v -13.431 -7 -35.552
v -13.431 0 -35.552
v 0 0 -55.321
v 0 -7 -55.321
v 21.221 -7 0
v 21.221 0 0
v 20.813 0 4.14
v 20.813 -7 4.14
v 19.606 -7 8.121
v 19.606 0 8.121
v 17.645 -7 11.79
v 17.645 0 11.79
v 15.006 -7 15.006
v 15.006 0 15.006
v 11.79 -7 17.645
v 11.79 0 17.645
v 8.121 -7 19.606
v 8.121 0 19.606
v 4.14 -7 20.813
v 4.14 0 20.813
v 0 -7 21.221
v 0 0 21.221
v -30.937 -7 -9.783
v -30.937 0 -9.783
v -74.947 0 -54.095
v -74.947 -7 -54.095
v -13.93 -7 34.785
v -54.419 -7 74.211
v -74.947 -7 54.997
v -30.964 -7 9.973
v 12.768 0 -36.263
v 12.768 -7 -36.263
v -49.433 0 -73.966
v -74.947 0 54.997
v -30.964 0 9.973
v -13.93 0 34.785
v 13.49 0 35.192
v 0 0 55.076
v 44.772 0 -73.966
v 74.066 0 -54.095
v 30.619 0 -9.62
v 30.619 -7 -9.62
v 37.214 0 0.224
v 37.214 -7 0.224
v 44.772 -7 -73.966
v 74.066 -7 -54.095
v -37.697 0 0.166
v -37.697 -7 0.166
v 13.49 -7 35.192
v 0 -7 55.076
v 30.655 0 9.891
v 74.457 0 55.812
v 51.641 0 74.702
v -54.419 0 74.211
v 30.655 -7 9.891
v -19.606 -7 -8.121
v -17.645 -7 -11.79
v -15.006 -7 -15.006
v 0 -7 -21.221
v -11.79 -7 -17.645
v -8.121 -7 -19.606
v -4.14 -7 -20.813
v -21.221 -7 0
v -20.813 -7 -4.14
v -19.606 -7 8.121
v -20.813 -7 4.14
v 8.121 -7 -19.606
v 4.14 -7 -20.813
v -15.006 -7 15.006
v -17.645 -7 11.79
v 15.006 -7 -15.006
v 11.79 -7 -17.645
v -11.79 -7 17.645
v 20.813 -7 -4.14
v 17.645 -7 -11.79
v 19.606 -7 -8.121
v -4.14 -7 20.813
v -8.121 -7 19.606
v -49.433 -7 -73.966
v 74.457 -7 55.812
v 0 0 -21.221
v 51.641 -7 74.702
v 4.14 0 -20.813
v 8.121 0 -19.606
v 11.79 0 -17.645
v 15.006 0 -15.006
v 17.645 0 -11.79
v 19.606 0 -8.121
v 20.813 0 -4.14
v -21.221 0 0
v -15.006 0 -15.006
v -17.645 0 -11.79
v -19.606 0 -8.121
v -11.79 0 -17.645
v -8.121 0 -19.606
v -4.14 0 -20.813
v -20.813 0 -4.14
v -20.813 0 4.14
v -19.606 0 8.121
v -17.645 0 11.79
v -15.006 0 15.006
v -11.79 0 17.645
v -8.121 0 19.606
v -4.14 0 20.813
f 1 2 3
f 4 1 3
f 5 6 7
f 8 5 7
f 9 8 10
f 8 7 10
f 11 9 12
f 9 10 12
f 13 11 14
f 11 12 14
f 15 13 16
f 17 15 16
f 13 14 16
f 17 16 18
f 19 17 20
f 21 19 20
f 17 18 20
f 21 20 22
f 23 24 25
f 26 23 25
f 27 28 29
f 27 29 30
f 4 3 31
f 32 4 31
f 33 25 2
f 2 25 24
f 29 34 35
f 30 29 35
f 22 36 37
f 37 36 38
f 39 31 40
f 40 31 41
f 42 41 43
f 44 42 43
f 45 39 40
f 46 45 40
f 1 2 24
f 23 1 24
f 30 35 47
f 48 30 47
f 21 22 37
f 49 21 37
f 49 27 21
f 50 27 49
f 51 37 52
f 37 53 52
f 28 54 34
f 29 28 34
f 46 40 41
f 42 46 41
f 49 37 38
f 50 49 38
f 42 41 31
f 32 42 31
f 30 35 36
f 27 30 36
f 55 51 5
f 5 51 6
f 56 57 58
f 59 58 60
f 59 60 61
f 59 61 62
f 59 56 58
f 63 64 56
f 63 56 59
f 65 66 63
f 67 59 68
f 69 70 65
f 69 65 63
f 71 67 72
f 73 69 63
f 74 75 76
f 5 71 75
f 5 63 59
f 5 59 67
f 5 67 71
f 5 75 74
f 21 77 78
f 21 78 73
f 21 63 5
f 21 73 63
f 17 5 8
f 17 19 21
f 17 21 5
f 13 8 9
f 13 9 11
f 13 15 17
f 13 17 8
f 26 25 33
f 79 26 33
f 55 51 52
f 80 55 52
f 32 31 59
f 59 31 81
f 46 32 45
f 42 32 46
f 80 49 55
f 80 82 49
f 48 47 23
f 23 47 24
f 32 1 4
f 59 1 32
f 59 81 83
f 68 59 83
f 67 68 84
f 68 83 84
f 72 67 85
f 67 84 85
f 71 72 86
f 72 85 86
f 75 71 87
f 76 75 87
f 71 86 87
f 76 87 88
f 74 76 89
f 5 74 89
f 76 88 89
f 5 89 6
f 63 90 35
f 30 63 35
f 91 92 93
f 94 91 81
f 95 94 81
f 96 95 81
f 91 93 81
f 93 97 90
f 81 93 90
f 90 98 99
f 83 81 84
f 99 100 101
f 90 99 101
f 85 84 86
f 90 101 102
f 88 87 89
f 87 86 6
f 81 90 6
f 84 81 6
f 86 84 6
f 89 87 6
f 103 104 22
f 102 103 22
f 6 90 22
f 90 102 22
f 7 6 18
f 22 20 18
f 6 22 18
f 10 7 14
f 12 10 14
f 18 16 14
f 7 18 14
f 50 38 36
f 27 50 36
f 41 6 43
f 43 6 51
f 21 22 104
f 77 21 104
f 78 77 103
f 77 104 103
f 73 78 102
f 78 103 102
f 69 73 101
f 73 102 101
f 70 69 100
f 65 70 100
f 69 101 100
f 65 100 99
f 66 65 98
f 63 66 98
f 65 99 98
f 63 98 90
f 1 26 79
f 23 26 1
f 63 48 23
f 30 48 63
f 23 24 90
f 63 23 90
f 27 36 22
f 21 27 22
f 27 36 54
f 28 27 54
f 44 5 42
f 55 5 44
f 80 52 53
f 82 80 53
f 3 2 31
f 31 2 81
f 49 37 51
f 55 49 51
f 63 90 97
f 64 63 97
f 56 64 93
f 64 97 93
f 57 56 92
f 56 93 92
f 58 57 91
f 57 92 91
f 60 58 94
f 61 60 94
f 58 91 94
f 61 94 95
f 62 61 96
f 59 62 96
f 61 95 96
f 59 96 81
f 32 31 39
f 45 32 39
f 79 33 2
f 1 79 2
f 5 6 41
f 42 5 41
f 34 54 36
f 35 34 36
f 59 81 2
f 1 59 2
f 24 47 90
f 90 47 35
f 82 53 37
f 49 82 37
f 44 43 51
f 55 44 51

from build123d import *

# Parameters (mm, degrees)
F1_DEPTH = 7


with BuildPart() as f1:
    # F0 (on Front) → F1 (new body)
    with BuildSketch(Plane.XZ):
        with BuildLine():
            ThreePointArc((0, -21.2211485282), (15.0056180289, -15.0056180289), (21.2211485282, 0))
            ThreePointArc((21.2211485282, 0), (15.0056180289, 15.0056180289), (0, 21.2211485282))
            ThreePointArc((0, 21.2211485282), (-15.0056180289, 15.0056180289), (-21.2211485282, 0))
            ThreePointArc((-21.2211485282, 0), (-15.0056180289, -15.0056180289), (0, -21.2211485282))
        make_face()
    extrude(amount=F1_DEPTH)


with BuildPart() as f1b:
    # F0 (on Front) → F1, piece 2 (new body)
    with BuildSketch(Plane.XZ):
        Polygon((-13.9298583474, 34.7853076235), (0, 21.2211485282), (13.490145677, 35.1918488728), (0, 55.0759360194), align=None)
    extrude(amount=F1_DEPTH)


with BuildPart() as f1c:
    # F0 (on Front) → F1, piece 3 (new body)
    with BuildSketch(Plane.XZ):
        Polygon((12.7684192229, -36.2632952124), (0, -21.2211485282), (-13.4308659869, -35.5517526687), (0, -55.321265012), align=None)
    extrude(amount=F1_DEPTH)


with BuildPart() as f1d:
    # F0 (on Front) → F1, piece 4 (new body)
    with BuildSketch(Plane.XZ):
        Polygon((30.6553779083, 9.890789733), (21.2211485282, 0), (30.6188318239, -9.6200108463), (37.213906036, 0.2237077038), align=None)
    extrude(amount=F1_DEPTH)


with BuildPart() as f1e:
    # F0 (on Front) → F1, piece 5 (new body)
    with BuildSketch(Plane.XZ):
        Polygon((-30.9374849861, -9.7829511085), (-21.2211485282, 0), (-30.9638172982, 9.9731578827), (-37.6965631901, 0.1660484656), align=None)
    extrude(amount=F1_DEPTH)


with BuildPart() as f1f:
    # F0 (on Front) → F1, piece 6 (new body)
    with BuildSketch(Plane.XZ):
        Polygon((13.490145677, 35.1918488728), (30.6553779083, 9.890789733), (74.4567811489, 55.8119192719), (51.6413562, 74.7021064162), align=None)
    extrude(amount=F1_DEPTH)


with BuildPart() as f1g:
    # F0 (on Front) → F1, piece 7 (new body)
    with BuildSketch(Plane.XZ):
        Polygon((-30.9638172982, 9.9731578827), (-13.9298583474, 34.7853076235), (-54.4189632423, 74.2114558816), (-74.9474316835, 54.9973233217), align=None)
    extrude(amount=F1_DEPTH)


with BuildPart() as f1h:
    # F0 (on Front) → F1, piece 8 (new body)
    with BuildSketch(Plane.XZ):
        Polygon((-49.433413893, -73.9661231637), (-13.4308659869, -35.5517526687), (-30.9374849861, -9.7829511085), (-74.9474316835, -54.0946274996), align=None)
    extrude(amount=F1_DEPTH)


with BuildPart() as f1i:
    # F0 (on Front) → F1, piece 9 (new body)
    with BuildSketch(Plane.XZ):
        Polygon((74.0655980158, -54.0946274996), (30.6188318239, -9.6200108463), (12.7684192229, -36.2632952124), (44.7721965611, -73.9661231637), align=None)
    extrude(amount=F1_DEPTH)


solid = Compound([f1.part, f1b.part, f1c.part, f1d.part, f1e.part, f1f.part, f1g.part, f1h.part, f1i.part])
